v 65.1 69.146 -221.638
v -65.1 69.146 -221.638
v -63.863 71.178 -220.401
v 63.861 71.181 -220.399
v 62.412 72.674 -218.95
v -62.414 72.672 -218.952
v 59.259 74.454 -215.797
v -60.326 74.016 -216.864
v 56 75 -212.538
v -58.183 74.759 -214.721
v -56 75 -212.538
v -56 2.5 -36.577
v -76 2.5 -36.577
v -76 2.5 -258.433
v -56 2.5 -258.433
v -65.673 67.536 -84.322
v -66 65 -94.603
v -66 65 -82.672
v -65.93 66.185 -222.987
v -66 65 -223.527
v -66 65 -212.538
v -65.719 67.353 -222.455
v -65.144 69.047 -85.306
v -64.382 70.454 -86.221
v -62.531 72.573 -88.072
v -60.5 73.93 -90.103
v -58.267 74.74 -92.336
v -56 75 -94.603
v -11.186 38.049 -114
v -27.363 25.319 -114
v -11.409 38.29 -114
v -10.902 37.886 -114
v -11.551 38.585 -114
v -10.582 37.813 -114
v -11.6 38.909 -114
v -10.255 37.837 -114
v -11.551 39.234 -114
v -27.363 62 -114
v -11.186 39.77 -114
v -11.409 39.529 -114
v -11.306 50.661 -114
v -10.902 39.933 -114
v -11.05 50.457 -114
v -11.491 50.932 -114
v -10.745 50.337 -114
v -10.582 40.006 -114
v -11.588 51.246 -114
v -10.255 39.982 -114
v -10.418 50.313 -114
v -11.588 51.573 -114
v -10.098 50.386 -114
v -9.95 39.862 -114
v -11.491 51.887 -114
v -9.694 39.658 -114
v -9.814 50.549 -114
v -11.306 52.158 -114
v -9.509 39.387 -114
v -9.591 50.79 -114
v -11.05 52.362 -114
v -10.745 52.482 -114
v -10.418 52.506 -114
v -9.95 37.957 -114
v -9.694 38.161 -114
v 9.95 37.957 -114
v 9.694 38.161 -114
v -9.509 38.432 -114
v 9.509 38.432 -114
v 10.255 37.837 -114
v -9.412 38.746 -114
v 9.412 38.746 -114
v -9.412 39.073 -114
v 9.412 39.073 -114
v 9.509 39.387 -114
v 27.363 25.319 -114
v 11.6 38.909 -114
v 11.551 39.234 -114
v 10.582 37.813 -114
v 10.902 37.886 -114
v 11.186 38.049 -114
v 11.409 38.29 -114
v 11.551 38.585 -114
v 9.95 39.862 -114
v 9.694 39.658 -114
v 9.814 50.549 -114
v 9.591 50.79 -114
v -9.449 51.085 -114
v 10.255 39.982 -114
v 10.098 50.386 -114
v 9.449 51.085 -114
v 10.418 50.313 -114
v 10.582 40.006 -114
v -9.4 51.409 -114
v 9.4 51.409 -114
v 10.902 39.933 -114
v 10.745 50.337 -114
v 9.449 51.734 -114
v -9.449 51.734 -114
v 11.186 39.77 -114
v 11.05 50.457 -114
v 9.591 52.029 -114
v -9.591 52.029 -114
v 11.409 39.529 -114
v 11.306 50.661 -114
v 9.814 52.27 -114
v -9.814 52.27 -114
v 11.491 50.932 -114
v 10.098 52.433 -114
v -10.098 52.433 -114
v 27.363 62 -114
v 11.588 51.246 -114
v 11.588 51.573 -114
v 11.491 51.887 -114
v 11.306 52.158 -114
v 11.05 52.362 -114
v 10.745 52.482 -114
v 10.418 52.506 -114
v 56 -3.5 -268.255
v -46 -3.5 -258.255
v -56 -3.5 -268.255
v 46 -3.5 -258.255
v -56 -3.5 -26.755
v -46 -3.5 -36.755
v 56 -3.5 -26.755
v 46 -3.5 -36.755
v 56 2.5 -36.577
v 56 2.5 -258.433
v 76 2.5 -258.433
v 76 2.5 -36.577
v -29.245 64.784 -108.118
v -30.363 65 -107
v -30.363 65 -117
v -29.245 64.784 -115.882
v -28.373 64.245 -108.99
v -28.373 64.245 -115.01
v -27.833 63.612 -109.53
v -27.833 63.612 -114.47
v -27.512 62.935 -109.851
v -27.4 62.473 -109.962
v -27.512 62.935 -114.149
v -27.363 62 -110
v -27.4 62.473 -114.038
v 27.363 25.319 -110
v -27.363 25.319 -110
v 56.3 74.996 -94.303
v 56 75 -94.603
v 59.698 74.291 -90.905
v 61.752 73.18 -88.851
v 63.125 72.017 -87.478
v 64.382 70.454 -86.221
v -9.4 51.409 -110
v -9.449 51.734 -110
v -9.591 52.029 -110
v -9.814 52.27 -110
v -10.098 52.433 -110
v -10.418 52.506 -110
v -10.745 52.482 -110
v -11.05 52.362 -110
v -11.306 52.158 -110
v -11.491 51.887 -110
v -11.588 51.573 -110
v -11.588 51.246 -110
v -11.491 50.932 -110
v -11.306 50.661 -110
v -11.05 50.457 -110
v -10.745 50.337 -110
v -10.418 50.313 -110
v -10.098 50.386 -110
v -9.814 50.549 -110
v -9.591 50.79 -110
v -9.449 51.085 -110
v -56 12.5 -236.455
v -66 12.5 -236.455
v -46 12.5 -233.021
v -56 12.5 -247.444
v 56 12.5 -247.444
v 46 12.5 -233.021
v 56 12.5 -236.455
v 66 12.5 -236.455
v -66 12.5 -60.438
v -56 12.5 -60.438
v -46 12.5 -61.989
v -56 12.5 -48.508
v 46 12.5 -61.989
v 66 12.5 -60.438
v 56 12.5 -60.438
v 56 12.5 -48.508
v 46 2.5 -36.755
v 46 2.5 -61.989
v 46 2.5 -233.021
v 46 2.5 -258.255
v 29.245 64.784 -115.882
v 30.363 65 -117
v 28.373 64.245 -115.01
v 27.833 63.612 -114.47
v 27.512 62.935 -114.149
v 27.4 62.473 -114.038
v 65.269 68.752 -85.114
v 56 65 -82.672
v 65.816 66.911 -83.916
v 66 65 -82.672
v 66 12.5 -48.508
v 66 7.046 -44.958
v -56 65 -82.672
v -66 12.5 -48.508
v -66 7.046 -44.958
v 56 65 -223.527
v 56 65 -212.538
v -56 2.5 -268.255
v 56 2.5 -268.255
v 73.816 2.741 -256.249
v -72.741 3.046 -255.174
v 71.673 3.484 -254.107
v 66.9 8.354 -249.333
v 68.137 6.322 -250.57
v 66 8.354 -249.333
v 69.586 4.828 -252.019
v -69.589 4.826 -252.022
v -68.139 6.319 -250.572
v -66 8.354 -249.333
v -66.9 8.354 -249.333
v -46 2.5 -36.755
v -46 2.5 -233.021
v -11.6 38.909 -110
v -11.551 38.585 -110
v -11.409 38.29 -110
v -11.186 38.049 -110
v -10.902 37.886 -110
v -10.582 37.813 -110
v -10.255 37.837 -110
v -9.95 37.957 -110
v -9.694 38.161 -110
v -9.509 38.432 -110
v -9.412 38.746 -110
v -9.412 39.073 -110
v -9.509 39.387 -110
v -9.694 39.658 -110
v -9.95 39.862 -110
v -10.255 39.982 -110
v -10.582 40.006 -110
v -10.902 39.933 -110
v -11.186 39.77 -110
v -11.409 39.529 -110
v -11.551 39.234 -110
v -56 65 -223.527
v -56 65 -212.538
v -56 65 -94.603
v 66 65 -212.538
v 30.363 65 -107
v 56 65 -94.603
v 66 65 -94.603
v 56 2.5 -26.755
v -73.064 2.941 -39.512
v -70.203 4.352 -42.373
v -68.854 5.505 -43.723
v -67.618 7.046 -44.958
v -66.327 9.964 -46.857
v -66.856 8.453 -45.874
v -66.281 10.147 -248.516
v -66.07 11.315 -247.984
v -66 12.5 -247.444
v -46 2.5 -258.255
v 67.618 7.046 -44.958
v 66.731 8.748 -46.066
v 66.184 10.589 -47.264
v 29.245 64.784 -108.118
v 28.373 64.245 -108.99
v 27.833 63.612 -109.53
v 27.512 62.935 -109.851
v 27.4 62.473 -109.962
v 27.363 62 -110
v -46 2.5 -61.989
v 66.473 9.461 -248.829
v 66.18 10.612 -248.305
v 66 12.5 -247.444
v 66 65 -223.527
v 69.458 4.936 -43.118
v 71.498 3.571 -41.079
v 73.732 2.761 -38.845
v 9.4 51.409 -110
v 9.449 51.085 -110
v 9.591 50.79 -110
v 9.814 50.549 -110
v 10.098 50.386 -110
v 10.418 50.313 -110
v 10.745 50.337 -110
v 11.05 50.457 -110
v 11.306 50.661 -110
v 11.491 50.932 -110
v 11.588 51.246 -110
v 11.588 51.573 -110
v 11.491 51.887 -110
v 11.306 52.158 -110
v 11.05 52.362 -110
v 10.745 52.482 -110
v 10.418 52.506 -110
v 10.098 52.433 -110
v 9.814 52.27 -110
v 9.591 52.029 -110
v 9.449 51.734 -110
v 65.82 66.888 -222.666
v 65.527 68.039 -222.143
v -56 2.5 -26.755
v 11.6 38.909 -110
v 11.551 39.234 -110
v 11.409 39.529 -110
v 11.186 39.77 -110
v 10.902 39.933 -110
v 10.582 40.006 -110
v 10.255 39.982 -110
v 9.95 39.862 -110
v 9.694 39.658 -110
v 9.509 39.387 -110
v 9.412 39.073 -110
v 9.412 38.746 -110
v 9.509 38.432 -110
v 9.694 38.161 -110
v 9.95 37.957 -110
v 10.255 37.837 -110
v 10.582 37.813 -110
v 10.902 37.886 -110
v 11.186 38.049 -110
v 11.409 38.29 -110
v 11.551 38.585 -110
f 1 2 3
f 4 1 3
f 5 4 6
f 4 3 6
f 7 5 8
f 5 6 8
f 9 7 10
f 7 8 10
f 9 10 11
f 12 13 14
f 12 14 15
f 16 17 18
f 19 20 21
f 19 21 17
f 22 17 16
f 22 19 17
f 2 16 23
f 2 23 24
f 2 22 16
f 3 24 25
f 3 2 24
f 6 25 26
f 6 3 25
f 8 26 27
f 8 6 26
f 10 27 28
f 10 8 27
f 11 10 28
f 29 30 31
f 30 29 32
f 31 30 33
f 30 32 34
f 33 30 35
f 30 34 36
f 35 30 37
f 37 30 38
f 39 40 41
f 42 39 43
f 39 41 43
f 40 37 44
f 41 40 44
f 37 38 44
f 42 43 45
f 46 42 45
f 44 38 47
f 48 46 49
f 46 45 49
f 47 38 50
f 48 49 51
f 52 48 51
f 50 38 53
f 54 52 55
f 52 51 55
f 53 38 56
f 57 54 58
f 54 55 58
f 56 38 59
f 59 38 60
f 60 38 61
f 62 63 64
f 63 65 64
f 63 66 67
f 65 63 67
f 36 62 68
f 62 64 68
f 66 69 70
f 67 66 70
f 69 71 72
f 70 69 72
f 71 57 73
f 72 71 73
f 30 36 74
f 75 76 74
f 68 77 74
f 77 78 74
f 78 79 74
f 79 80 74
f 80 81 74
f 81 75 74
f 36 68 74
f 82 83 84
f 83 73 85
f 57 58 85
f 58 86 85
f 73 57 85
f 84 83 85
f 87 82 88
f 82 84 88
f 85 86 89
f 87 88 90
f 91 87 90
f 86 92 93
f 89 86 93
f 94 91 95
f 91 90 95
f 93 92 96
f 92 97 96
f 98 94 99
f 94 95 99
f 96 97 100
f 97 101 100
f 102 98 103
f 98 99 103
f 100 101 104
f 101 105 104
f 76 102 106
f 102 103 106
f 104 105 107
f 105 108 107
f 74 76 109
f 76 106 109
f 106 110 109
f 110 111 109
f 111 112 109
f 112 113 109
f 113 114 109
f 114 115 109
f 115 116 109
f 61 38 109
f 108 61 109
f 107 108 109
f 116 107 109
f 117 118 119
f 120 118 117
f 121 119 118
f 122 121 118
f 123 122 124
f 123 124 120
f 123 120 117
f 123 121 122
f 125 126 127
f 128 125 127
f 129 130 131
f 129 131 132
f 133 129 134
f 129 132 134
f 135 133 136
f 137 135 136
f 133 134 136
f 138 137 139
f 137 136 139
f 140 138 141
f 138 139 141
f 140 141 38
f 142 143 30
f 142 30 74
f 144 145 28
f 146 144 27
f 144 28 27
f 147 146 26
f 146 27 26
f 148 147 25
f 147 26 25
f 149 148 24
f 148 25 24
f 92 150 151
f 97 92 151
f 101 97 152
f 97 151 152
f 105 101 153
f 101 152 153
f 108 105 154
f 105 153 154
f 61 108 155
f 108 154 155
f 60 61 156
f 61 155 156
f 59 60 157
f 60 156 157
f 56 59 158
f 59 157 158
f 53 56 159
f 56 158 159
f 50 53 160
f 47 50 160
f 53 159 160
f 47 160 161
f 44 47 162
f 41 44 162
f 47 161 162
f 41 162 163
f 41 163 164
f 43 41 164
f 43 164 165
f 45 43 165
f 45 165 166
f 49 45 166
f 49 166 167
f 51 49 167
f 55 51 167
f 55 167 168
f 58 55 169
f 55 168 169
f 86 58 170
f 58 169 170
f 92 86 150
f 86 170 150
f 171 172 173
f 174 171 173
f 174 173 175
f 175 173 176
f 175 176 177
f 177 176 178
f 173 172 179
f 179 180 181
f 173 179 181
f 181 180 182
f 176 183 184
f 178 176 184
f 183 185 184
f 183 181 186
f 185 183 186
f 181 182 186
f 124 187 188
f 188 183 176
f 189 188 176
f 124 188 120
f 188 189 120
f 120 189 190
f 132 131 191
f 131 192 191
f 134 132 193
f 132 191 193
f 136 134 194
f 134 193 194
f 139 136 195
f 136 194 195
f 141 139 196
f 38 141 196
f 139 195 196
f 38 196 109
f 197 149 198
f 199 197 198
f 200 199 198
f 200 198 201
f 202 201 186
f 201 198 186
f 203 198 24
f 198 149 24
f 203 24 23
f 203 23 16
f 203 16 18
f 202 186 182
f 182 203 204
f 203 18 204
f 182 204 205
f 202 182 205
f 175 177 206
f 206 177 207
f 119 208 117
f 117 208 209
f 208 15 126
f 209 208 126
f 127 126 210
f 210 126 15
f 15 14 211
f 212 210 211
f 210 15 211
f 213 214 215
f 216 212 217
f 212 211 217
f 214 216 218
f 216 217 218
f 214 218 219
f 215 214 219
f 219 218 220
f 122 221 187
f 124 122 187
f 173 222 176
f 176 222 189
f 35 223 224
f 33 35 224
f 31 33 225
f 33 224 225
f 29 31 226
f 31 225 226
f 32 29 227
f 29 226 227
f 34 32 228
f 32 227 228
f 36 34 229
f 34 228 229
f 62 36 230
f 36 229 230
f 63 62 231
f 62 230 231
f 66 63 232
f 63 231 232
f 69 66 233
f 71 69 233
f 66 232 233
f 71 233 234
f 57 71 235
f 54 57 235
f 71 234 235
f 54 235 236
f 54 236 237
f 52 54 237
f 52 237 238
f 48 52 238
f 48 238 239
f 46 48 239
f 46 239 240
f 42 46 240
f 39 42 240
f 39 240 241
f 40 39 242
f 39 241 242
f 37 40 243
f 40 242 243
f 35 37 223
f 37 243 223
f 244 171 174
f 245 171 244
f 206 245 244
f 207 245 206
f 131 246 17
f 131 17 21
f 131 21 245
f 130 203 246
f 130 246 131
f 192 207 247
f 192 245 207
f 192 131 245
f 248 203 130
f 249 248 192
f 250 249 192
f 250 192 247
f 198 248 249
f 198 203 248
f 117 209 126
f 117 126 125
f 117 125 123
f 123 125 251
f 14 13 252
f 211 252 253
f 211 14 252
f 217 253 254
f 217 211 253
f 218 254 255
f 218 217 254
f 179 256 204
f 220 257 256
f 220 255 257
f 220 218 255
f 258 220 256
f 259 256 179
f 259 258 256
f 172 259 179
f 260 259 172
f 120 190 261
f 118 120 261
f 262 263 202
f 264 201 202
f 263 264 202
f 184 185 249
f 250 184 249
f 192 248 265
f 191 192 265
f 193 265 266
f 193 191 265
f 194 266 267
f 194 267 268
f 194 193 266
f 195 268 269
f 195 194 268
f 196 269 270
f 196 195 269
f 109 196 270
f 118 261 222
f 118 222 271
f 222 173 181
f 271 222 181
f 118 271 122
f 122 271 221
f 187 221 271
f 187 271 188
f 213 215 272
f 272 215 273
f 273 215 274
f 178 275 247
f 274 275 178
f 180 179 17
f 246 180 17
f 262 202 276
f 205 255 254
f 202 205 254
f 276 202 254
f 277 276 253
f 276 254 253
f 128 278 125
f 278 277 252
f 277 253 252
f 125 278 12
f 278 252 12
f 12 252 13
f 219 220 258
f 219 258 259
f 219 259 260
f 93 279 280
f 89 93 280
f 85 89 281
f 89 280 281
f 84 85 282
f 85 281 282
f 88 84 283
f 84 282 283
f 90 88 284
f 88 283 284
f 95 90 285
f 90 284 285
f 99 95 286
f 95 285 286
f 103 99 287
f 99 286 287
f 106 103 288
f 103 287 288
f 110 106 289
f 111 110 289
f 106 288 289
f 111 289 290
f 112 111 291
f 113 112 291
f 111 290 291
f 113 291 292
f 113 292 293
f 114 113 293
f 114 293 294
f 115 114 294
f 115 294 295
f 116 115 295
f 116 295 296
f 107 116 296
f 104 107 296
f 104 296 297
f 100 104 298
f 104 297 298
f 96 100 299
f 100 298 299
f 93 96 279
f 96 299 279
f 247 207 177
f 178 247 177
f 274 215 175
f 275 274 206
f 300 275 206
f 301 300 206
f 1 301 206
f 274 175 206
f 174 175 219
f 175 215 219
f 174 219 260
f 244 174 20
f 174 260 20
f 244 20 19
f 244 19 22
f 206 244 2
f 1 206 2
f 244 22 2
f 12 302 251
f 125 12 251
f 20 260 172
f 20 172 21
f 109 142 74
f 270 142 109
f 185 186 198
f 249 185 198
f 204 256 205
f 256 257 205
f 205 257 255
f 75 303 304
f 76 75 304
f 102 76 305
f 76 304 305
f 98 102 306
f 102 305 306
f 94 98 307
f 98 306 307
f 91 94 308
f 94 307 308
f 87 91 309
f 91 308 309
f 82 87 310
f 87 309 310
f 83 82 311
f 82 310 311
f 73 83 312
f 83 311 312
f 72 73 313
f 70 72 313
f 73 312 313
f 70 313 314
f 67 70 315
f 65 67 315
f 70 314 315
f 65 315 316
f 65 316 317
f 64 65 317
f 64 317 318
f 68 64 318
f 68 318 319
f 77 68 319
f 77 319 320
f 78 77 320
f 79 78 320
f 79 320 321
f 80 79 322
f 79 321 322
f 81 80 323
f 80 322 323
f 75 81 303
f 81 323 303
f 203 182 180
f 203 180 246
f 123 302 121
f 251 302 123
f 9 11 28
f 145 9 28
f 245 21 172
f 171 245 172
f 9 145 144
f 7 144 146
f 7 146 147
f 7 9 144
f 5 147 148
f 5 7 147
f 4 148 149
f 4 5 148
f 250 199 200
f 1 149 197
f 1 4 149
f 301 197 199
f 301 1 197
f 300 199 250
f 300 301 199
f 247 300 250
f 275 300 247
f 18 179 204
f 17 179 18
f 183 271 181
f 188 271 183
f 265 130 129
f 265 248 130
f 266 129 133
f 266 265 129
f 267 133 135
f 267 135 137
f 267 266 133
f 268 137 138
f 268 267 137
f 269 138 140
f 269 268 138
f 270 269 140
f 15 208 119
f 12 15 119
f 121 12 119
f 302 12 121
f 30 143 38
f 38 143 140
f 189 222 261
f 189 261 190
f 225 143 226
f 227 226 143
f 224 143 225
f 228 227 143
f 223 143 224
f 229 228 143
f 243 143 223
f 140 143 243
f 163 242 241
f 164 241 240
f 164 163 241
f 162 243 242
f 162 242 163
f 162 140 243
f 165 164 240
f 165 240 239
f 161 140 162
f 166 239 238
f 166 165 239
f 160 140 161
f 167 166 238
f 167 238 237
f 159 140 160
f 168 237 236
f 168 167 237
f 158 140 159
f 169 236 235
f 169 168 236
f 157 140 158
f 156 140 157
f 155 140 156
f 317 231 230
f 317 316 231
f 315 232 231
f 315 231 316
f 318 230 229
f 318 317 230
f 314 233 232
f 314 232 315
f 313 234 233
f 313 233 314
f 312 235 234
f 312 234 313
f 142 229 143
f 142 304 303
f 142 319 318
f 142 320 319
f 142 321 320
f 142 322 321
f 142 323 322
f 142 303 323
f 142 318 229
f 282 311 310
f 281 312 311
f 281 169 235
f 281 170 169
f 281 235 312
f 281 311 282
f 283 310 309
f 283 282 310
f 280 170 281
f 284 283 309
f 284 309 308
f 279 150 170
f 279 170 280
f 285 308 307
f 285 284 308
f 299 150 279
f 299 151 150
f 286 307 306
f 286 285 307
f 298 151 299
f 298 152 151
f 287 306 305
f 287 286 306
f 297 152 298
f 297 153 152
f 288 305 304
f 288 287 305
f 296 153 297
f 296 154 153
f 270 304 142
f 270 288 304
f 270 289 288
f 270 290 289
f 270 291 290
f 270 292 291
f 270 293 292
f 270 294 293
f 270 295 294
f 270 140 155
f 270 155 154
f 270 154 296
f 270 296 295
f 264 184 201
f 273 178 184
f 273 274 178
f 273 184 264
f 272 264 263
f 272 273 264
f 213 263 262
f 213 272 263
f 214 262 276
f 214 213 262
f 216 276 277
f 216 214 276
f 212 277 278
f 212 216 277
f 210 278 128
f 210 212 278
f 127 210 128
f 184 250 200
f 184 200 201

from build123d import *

# Parameters (mm, degrees)
SKETCH1_W           = 200
SKETCH1_H           = 150
BOSS_EXTRUDE1_DEPTH = 280
SKETCH2_W           = 44
SKETCH2_H           = 60
SKETCH2_W_2         = 34
SKETCH2_H_2         = 72.5
CUT_EXTRUDE1_DEPTH  = 280
CUT_EXTRUDE5_DEPTH  = 200
CUT_EXTRUDE8_DEPTH  = 44
CUT_EXTRUDE9_DEPTH  = 44
SKETCH6_W           = 112
SKETCH6_H           = 52.5
CUT_EXTRUDE7_DEPTH  = 280
FILLET1_START       = -100
FILLET1_DEPTH       = 200
FILLET1_START_2     = -76
FILLET1_2_DEPTH     = 10
FILLET1_START_3     = 66
FILLET1_3_DEPTH     = 10
FILLET1_START_4     = -66
FILLET1_4_DEPTH     = 132
FILLET1_START_5     = -281
FILLET1_5_DEPTH     = 282
SKETCH8_W           = 211.062900289
SKETCH8_H           = 77.5
CUT_EXTRUDE10_DEPTH = 280
SKETCH10_W          = 112
SKETCH10_H          = 9.821718876
SKETCH10_H_2        = 221.856562249
SKETCH10_H_3        = 9.821718875
BOSS_EXTRUDE2_DEPTH = 6
SKETCH10_4_W        = 92
SKETCH10_4_H        = 171.032653569
CUT_EXTRUDE11_DEPTH = 10
BOSS_EXTRUDE3_START = -110
SKETCH11_W          = 54.725299756
SKETCH11_H          = 39.681004686
SKETCH11_R          = 1.1
BOSS_EXTRUDE3_DEPTH = 4
FILLET2_R           = 3


with BuildPart() as part:
    # Sketch1 → Boss-Extrude1 (new body)
    with BuildSketch(Plane.XY):
        Rectangle(SKETCH1_W, SKETCH1_H)
    extrude(amount=-BOSS_EXTRUDE1_DEPTH)

    # Sketch2 → Cut-Extrude1 (cut)
    with BuildSketch(Plane.XY):
        with Locations((78, -45)):
            Rectangle(SKETCH2_W, SKETCH2_H)
        with Locations((-78, -45)):
            Rectangle(SKETCH2_W, SKETCH2_H)
        with Locations((83, 38.75)):
            Rectangle(SKETCH2_W_2, SKETCH2_H_2)
        with Locations((-83, 38.75)):
            Rectangle(SKETCH2_W_2, SKETCH2_H_2)
    extrude(amount=-CUT_EXTRUDE1_DEPTH, mode=Mode.SUBTRACT)

    # Sketch3 → Cut-Extrude5 (cut)
    with BuildSketch(Plane.ZY.offset(100)):
        Polygon((-280, 2.5), (-274.399041425, 2.5), (-252, 2.5), (-218.971094498, 75), (-280, 75), align=None)
        Polygon((-236.455453487, 12.5), (-168.766953205, 12.5), (-60.438488841, 12.5), (-94.602997447, 65), (-144.84946991, 65), (-212.537970192, 65), align=None)
        Polygon((-89.179559504, 75), (-42, 2.5), (-5.600958575, 2.5), (0, 2.5), (0, 75), align=None)
    extrude(amount=-CUT_EXTRUDE5_DEPTH, mode=Mode.SUBTRACT)

    # Sketch5 → Cut-Extrude8 (cut)
    with BuildSketch(Plane.ZY.offset(100)):
        Polygon((-264.773291637, -7.125749789), (-270.374250211, -15), (-140, -15), (-140, -7.125749789), align=None)
        Polygon((-15.226708363, -7.125749789), (-140, -7.125749789), (-140, -15), (-9.625749789, -15), align=None)
    extrude(amount=-CUT_EXTRUDE8_DEPTH, mode=Mode.SUBTRACT)

    # Sketch7 → Cut-Extrude9 (cut)
    with BuildSketch(Plane(origin=(100, 0, 0), x_dir=(0, 0, -1), z_dir=(1, 0, 0))):
        Polygon((9.625749789, -15), (15.226708363, -7.125749789), (264.773291637, -7.125749789), (270.374250211, -15), align=None)
    extrude(amount=-CUT_EXTRUDE9_DEPTH, mode=Mode.SUBTRACT)

    # Sketch6 → Cut-Extrude7 (cut)
    with BuildSketch(Plane.XY):
        with Locations((0, 38.75)):
            Rectangle(SKETCH6_W, SKETCH6_H)
    extrude(amount=-CUT_EXTRUDE7_DEPTH, mode=Mode.SUBTRACT)

    # Fillet1: read off the stored shape, not the designer's step
    # Fillet1 outline → Fillet1 (cut)
    with BuildSketch(Plane.YZ.offset(FILLET1_START)):
        with BuildLine():
            Line((-75, 0), (-75, -10))
            ThreePointArc((-75, -10), (-72.071067812, -2.928932188), (-65, 0))
            Line((-65, 0), (-75, 0))
        make_face()
        with BuildLine():
            ThreePointArc((-65, -280), (-72.071067812, -277.071067812), (-75, -270))
            Line((-75, -270), (-75, -280))
            Line((-75, -280), (-65, -280))
        make_face()
        with BuildLine():
            Line((2.5, 0), (-7.5, 0))
            ThreePointArc((-7.5, 0), (-0.428932188, -2.928932188), (2.5, -10))
            Line((2.5, -10), (2.5, 0))
        make_face()
        with BuildLine():
            ThreePointArc((2.5, -270), (-0.428932188, -277.071067812), (-7.5, -280))
            Line((-7.5, -280), (2.5, -280))
            Line((2.5, -280), (2.5, -270))
        make_face()
        with BuildLine():
            Line((75, -89.179559504), (70.454316835, -86.221444616))
            ThreePointArc((70.454316835, -86.221444616), (73.790425711, -89.835564613), (75, -94.602997447))
            Line((75, -94.602997447), (75, -89.179559504))
        make_face()
        with BuildLine():
            ThreePointArc((75, -212.537970192), (73.410042611, -217.948255145), (69.145763344, -221.638115591))
            Line((69.145763344, -221.638115591), (75, -218.971094498))
            Line((75, -218.971094498), (75, -212.537970192))
        make_face()
    extrude(amount=FILLET1_DEPTH, mode=Mode.SUBTRACT)

    # Fillet1 2 outline → Fillet1 2 (add)
    with BuildSketch(Plane.YZ.offset(FILLET1_START_2)):
        with BuildLine():
            ThreePointArc((7.045683165, -44.958114888), (3.709574289, -41.343994891), (2.5, -36.576562057))
            Line((2.5, -36.576562057), (2.5, -258.433124306))
            ThreePointArc((2.5, -258.433124306), (4.089957389, -253.022839352), (8.354236656, -249.332978906))
            Line((8.354236656, -249.332978906), (69.145763344, -221.638115591))
            ThreePointArc((69.145763344, -221.638115591), (73.410042611, -217.948255145), (75, -212.537970192))
            Line((75, -212.537970192), (75, -94.602997447))
            ThreePointArc((75, -94.602997447), (73.790425711, -89.835564613), (70.454316835, -86.221444616))
            Line((70.454316835, -86.221444616), (7.045683165, -44.958114888))
        make_face()
    extrude(amount=FILLET1_2_DEPTH)

    # Fillet1 3 outline → Fillet1 3 (add)
    with BuildSketch(Plane.YZ.offset(FILLET1_START_3)):
        with BuildLine():
            ThreePointArc((7.045683165, -44.958114888), (3.709574289, -41.343994891), (2.5, -36.576562057))
            Line((2.5, -36.576562057), (2.5, -258.433124306))
            ThreePointArc((2.5, -258.433124306), (4.089957389, -253.022839352), (8.354236656, -249.332978906))
            Line((8.354236656, -249.332978906), (69.145763344, -221.638115591))
            ThreePointArc((69.145763344, -221.638115591), (73.410042611, -217.948255145), (75, -212.537970192))
            Line((75, -212.537970192), (75, -94.602997447))
            ThreePointArc((75, -94.602997447), (73.790425711, -89.835564613), (70.454316835, -86.221444616))
            Line((70.454316835, -86.221444616), (7.045683165, -44.958114888))
        make_face()
    extrude(amount=FILLET1_3_DEPTH)

    # Fillet1 4 outline → Fillet1 4 (add)
    with BuildSketch(Plane.YZ.offset(FILLET1_START_4)):
        with BuildLine():
            ThreePointArc((7.045683165, -44.958114888), (3.709574289, -41.343994891), (2.5, -36.576562057))
            Line((2.5, -36.576562057), (2.5, -42))
            Line((2.5, -42), (7.045683165, -44.958114888))
        make_face()
        with BuildLine():
            Line((2.5, -252), (2.5, -258.433124306))
            ThreePointArc((2.5, -258.433124306), (4.089957389, -253.022839352), (8.354236656, -249.332978906))
            Line((8.354236656, -249.332978906), (2.5, -252))
        make_face()
    extrude(amount=FILLET1_4_DEPTH)

    # Fillet1 5 outline → Fillet1 5 (cut)
    with BuildSketch(Plane.XY.offset(FILLET1_START_5)):
        with BuildLine():
            ThreePointArc((56, 75), (63.071067812, 72.071067812), (66, 65))
            Line((66, 65), (66, 12.5))
            ThreePointArc((66, 12.5), (68.928932188, 5.428932188), (76, 2.5))
            Line((76, 2.5), (76, 75))
            Line((76, 75), (56, 75))
        make_face()
        with BuildLine():
            ThreePointArc((-66, 65), (-63.071067812, 72.071067812), (-56, 75))
            Line((-56, 75), (-76, 75))
            Line((-76, 75), (-76, 2.5))
            ThreePointArc((-76, 2.5), (-68.928932188, 5.428932188), (-66, 12.5))
            Line((-66, 12.5), (-66, 65))
        make_face()
        with BuildLine():
            Line((100, 2.5), (90, 2.5))
            ThreePointArc((90, 2.5), (97.071067812, -0.428932188), (100, -7.5))
            Line((100, -7.5), (100, 2.5))
        make_face()
        with BuildLine():
            Line((-90, 2.5), (-100, 2.5))
            Line((-100, 2.5), (-100, -7.5))
            ThreePointArc((-100, -7.5), (-97.071067812, -0.428932188), (-90, 2.5))
        make_face()
        with BuildLine():
            Line((56, -75), (56, -65))
            ThreePointArc((56, -65), (53.071067812, -72.071067812), (46, -75))
            Line((46, -75), (56, -75))
        make_face()
        with BuildLine():
            ThreePointArc((-46, -75), (-53.071067812, -72.071067812), (-56, -65))
            Line((-56, -65), (-56, -75))
            Line((-56, -75), (-46, -75))
        make_face()
    extrude(amount=FILLET1_5_DEPTH, mode=Mode.SUBTRACT)

    # Sketch8 → Cut-Extrude10 (cut)
    with BuildSketch(Plane.XY):
        with Locations((0.683956476, -36.25)):
            Rectangle(SKETCH8_W, SKETCH8_H)
    extrude(amount=-CUT_EXTRUDE10_DEPTH, mode=Mode.SUBTRACT)

    # Sketch10 → Boss-Extrude2 (add)
    # profile 1 of 3: a face of its own
    with BuildSketch(Plane.XZ.offset(-2.5)):
        with Locations((0, -31.665702619)):
            Rectangle(SKETCH10_W, SKETCH10_H)
    # profile 2 of 3: a face of its own
    with BuildSketch(Plane.XZ.offset(-2.5)):
        with Locations((0, -147.504843182)):
            Rectangle(SKETCH10_W, SKETCH10_H_2)
        Polygon((-46, -61.988516397), (-46, -36.754843181), (46, -36.754843181), (46, -61.988516397), (46, -233.021169966), (46, -258.254843181), (-46, -258.254843181), (-46, -233.021169966), align=None, mode=Mode.SUBTRACT)
    # profile 3 of 3: a face of its own
    with BuildSketch(Plane.XZ.offset(-2.5)):
        with Locations((0, -263.343983744)):
            Rectangle(SKETCH10_W, SKETCH10_H_3)
    extrude(amount=BOSS_EXTRUDE2_DEPTH)

    # Sketch10<4> → Cut-Extrude11 (cut)
    with BuildSketch(Plane.XZ.offset(-2.5)):
        with Locations((0, -147.504843182)):
            Rectangle(SKETCH10_4_W, SKETCH10_4_H)
    extrude(amount=-CUT_EXTRUDE11_DEPTH, mode=Mode.SUBTRACT)

    # Sketch11 → Boss-Extrude3 (add)
    with BuildSketch(Plane.XY.offset(BOSS_EXTRUDE3_START)):
        with Locations((0, 45.159497657)):
            Rectangle(SKETCH11_W, SKETCH11_H)
        with Locations((-10.5, 51.409497657)):
            Circle(SKETCH11_R, mode=Mode.SUBTRACT)
        with Locations(Location((10.5, 51.409497657, 0), (0, 0, 180))):
            Circle(SKETCH11_R, mode=Mode.SUBTRACT)
        with Locations((10.5, 38.909497657)):
            Circle(SKETCH11_R, mode=Mode.SUBTRACT)
        with Locations(Location((-10.5, 38.909497657, 0), (0, 0, 180))):
            Circle(SKETCH11_R, mode=Mode.SUBTRACT)
    extrude(amount=-BOSS_EXTRUDE3_DEPTH)

    # Fillet2
    fillet2_edges = [part.edges().sort_by_distance(p)[0] for p in [
        (0, 65, -114),
        (-27.362649878, 65, -112),
        (27.362649878, 65, -112),
        (0, 65, -110),
    ]]
    fillet(fillet2_edges, radius=FILLET2_R)


solid = part.part
